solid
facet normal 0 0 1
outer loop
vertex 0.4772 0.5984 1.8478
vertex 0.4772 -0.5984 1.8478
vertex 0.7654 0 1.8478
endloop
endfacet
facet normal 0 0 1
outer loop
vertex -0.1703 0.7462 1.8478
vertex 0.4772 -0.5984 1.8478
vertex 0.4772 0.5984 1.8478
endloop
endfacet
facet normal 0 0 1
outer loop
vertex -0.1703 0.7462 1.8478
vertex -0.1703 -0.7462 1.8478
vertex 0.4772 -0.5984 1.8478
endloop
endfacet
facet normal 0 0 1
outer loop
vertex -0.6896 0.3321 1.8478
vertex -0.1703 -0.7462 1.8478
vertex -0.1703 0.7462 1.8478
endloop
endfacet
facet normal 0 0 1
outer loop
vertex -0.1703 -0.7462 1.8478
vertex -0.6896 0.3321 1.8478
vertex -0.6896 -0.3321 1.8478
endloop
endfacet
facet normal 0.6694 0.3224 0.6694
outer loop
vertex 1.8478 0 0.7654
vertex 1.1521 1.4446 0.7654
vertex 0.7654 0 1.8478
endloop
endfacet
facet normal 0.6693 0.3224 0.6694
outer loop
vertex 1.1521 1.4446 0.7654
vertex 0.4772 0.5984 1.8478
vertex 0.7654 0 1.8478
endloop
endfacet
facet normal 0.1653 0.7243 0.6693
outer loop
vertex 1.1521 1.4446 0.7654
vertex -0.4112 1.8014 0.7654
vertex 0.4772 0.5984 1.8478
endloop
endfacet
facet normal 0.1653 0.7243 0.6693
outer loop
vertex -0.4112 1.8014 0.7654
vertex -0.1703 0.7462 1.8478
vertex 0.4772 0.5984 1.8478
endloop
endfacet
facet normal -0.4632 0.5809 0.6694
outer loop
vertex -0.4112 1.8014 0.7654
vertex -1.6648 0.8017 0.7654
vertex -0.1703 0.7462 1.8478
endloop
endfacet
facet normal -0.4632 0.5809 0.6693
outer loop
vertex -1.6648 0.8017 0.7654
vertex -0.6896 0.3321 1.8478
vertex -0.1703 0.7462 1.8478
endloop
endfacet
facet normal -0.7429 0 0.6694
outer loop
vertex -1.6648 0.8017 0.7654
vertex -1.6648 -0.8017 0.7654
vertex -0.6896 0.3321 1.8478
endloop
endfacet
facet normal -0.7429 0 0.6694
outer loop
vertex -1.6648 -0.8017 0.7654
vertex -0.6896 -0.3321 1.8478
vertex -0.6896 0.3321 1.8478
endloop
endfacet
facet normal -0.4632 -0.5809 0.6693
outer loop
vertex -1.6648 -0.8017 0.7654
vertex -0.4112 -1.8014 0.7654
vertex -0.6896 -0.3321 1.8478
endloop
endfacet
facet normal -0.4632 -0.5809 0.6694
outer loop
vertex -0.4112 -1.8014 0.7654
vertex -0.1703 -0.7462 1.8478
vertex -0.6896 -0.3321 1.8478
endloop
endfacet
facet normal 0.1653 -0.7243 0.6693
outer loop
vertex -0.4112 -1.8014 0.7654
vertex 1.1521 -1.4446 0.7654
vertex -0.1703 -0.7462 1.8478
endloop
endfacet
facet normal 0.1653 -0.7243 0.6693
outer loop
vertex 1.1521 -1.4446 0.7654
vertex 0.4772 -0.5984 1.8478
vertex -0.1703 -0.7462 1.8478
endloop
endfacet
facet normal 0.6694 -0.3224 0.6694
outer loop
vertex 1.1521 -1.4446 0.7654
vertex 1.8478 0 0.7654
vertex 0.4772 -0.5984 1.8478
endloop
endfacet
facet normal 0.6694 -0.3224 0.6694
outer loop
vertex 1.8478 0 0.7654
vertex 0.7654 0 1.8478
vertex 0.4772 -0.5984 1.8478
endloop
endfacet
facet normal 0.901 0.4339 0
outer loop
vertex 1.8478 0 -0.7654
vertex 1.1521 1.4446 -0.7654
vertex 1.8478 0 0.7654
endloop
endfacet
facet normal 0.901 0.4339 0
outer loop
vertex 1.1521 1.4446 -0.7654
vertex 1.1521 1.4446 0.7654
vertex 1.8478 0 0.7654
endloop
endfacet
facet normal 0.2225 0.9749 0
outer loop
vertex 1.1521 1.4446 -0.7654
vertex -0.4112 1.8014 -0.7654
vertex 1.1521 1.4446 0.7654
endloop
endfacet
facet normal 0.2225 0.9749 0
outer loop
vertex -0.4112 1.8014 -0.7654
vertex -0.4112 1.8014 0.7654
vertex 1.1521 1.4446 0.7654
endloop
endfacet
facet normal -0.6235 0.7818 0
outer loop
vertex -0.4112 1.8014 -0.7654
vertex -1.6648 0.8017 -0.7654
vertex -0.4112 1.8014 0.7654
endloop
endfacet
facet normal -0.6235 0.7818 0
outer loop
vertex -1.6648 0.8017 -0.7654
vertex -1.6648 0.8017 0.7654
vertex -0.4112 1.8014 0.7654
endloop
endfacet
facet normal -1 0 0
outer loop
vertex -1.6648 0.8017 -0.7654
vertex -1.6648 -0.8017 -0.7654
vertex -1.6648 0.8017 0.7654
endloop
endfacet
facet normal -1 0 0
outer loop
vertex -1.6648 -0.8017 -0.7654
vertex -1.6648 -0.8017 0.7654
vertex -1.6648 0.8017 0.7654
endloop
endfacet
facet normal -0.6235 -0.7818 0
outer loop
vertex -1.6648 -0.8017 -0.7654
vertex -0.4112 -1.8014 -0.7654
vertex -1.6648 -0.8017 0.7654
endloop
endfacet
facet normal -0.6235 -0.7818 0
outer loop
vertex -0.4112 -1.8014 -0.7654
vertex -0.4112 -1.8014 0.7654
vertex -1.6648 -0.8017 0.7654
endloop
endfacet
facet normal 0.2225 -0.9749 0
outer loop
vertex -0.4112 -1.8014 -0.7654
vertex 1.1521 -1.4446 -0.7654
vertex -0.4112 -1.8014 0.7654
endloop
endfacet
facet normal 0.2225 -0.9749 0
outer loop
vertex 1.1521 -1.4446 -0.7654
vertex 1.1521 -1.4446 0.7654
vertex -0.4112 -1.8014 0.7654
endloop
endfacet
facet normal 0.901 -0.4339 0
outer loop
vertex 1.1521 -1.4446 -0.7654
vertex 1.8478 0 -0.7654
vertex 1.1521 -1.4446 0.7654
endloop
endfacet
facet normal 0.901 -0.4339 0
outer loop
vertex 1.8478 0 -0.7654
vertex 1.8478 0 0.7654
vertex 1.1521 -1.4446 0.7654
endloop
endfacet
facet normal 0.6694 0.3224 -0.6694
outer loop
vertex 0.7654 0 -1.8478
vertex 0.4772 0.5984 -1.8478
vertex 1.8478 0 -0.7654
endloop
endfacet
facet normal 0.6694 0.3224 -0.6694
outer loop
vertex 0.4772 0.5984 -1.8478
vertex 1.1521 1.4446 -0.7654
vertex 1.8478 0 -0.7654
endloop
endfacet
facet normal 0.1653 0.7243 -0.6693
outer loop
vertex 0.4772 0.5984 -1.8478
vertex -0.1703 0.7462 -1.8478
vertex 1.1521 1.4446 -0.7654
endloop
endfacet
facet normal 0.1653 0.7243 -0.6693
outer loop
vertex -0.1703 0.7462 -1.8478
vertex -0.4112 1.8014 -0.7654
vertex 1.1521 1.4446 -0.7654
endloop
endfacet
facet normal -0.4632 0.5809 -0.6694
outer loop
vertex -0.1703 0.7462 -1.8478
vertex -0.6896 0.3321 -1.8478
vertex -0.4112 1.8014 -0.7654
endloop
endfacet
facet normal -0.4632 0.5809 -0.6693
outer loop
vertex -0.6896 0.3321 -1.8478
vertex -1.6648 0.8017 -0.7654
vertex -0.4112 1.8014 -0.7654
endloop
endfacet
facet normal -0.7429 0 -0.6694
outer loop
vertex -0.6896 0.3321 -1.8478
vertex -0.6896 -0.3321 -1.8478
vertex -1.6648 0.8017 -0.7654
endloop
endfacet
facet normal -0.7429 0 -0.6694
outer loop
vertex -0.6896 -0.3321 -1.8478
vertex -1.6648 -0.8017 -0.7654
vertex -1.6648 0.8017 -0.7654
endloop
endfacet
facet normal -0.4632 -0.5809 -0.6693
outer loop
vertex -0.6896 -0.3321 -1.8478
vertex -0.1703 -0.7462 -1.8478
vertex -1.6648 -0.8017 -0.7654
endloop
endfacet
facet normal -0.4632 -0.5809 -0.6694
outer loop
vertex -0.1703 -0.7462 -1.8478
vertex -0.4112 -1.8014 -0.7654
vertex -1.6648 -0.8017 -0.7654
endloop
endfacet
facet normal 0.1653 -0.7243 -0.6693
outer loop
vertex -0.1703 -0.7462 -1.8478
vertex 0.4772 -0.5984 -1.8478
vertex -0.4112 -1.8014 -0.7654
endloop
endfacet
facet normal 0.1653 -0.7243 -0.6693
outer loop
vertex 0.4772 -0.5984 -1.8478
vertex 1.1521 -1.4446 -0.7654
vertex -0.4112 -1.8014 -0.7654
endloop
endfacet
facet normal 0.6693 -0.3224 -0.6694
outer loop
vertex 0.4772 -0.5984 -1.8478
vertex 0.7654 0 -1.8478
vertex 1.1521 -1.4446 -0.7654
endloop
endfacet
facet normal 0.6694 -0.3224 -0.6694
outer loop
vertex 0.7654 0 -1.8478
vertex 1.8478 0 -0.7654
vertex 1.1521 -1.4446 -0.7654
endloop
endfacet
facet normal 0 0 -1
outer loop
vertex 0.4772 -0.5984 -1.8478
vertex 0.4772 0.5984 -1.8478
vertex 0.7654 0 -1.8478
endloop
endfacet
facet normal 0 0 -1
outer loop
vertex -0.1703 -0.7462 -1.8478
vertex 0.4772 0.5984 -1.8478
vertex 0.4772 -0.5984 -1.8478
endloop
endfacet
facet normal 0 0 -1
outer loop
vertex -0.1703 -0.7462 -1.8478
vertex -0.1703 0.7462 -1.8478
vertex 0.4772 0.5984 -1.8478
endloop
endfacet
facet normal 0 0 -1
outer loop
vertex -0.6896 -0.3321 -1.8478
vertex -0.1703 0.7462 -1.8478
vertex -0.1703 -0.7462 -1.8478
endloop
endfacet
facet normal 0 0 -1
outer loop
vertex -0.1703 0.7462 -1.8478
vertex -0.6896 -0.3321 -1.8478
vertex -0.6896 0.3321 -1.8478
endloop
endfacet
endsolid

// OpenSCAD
/* [Hidden] */

// onescad: lib.scad

module used() { sub(); }

module sub() { sphere(2); }

// onescad: main.scad

used();
